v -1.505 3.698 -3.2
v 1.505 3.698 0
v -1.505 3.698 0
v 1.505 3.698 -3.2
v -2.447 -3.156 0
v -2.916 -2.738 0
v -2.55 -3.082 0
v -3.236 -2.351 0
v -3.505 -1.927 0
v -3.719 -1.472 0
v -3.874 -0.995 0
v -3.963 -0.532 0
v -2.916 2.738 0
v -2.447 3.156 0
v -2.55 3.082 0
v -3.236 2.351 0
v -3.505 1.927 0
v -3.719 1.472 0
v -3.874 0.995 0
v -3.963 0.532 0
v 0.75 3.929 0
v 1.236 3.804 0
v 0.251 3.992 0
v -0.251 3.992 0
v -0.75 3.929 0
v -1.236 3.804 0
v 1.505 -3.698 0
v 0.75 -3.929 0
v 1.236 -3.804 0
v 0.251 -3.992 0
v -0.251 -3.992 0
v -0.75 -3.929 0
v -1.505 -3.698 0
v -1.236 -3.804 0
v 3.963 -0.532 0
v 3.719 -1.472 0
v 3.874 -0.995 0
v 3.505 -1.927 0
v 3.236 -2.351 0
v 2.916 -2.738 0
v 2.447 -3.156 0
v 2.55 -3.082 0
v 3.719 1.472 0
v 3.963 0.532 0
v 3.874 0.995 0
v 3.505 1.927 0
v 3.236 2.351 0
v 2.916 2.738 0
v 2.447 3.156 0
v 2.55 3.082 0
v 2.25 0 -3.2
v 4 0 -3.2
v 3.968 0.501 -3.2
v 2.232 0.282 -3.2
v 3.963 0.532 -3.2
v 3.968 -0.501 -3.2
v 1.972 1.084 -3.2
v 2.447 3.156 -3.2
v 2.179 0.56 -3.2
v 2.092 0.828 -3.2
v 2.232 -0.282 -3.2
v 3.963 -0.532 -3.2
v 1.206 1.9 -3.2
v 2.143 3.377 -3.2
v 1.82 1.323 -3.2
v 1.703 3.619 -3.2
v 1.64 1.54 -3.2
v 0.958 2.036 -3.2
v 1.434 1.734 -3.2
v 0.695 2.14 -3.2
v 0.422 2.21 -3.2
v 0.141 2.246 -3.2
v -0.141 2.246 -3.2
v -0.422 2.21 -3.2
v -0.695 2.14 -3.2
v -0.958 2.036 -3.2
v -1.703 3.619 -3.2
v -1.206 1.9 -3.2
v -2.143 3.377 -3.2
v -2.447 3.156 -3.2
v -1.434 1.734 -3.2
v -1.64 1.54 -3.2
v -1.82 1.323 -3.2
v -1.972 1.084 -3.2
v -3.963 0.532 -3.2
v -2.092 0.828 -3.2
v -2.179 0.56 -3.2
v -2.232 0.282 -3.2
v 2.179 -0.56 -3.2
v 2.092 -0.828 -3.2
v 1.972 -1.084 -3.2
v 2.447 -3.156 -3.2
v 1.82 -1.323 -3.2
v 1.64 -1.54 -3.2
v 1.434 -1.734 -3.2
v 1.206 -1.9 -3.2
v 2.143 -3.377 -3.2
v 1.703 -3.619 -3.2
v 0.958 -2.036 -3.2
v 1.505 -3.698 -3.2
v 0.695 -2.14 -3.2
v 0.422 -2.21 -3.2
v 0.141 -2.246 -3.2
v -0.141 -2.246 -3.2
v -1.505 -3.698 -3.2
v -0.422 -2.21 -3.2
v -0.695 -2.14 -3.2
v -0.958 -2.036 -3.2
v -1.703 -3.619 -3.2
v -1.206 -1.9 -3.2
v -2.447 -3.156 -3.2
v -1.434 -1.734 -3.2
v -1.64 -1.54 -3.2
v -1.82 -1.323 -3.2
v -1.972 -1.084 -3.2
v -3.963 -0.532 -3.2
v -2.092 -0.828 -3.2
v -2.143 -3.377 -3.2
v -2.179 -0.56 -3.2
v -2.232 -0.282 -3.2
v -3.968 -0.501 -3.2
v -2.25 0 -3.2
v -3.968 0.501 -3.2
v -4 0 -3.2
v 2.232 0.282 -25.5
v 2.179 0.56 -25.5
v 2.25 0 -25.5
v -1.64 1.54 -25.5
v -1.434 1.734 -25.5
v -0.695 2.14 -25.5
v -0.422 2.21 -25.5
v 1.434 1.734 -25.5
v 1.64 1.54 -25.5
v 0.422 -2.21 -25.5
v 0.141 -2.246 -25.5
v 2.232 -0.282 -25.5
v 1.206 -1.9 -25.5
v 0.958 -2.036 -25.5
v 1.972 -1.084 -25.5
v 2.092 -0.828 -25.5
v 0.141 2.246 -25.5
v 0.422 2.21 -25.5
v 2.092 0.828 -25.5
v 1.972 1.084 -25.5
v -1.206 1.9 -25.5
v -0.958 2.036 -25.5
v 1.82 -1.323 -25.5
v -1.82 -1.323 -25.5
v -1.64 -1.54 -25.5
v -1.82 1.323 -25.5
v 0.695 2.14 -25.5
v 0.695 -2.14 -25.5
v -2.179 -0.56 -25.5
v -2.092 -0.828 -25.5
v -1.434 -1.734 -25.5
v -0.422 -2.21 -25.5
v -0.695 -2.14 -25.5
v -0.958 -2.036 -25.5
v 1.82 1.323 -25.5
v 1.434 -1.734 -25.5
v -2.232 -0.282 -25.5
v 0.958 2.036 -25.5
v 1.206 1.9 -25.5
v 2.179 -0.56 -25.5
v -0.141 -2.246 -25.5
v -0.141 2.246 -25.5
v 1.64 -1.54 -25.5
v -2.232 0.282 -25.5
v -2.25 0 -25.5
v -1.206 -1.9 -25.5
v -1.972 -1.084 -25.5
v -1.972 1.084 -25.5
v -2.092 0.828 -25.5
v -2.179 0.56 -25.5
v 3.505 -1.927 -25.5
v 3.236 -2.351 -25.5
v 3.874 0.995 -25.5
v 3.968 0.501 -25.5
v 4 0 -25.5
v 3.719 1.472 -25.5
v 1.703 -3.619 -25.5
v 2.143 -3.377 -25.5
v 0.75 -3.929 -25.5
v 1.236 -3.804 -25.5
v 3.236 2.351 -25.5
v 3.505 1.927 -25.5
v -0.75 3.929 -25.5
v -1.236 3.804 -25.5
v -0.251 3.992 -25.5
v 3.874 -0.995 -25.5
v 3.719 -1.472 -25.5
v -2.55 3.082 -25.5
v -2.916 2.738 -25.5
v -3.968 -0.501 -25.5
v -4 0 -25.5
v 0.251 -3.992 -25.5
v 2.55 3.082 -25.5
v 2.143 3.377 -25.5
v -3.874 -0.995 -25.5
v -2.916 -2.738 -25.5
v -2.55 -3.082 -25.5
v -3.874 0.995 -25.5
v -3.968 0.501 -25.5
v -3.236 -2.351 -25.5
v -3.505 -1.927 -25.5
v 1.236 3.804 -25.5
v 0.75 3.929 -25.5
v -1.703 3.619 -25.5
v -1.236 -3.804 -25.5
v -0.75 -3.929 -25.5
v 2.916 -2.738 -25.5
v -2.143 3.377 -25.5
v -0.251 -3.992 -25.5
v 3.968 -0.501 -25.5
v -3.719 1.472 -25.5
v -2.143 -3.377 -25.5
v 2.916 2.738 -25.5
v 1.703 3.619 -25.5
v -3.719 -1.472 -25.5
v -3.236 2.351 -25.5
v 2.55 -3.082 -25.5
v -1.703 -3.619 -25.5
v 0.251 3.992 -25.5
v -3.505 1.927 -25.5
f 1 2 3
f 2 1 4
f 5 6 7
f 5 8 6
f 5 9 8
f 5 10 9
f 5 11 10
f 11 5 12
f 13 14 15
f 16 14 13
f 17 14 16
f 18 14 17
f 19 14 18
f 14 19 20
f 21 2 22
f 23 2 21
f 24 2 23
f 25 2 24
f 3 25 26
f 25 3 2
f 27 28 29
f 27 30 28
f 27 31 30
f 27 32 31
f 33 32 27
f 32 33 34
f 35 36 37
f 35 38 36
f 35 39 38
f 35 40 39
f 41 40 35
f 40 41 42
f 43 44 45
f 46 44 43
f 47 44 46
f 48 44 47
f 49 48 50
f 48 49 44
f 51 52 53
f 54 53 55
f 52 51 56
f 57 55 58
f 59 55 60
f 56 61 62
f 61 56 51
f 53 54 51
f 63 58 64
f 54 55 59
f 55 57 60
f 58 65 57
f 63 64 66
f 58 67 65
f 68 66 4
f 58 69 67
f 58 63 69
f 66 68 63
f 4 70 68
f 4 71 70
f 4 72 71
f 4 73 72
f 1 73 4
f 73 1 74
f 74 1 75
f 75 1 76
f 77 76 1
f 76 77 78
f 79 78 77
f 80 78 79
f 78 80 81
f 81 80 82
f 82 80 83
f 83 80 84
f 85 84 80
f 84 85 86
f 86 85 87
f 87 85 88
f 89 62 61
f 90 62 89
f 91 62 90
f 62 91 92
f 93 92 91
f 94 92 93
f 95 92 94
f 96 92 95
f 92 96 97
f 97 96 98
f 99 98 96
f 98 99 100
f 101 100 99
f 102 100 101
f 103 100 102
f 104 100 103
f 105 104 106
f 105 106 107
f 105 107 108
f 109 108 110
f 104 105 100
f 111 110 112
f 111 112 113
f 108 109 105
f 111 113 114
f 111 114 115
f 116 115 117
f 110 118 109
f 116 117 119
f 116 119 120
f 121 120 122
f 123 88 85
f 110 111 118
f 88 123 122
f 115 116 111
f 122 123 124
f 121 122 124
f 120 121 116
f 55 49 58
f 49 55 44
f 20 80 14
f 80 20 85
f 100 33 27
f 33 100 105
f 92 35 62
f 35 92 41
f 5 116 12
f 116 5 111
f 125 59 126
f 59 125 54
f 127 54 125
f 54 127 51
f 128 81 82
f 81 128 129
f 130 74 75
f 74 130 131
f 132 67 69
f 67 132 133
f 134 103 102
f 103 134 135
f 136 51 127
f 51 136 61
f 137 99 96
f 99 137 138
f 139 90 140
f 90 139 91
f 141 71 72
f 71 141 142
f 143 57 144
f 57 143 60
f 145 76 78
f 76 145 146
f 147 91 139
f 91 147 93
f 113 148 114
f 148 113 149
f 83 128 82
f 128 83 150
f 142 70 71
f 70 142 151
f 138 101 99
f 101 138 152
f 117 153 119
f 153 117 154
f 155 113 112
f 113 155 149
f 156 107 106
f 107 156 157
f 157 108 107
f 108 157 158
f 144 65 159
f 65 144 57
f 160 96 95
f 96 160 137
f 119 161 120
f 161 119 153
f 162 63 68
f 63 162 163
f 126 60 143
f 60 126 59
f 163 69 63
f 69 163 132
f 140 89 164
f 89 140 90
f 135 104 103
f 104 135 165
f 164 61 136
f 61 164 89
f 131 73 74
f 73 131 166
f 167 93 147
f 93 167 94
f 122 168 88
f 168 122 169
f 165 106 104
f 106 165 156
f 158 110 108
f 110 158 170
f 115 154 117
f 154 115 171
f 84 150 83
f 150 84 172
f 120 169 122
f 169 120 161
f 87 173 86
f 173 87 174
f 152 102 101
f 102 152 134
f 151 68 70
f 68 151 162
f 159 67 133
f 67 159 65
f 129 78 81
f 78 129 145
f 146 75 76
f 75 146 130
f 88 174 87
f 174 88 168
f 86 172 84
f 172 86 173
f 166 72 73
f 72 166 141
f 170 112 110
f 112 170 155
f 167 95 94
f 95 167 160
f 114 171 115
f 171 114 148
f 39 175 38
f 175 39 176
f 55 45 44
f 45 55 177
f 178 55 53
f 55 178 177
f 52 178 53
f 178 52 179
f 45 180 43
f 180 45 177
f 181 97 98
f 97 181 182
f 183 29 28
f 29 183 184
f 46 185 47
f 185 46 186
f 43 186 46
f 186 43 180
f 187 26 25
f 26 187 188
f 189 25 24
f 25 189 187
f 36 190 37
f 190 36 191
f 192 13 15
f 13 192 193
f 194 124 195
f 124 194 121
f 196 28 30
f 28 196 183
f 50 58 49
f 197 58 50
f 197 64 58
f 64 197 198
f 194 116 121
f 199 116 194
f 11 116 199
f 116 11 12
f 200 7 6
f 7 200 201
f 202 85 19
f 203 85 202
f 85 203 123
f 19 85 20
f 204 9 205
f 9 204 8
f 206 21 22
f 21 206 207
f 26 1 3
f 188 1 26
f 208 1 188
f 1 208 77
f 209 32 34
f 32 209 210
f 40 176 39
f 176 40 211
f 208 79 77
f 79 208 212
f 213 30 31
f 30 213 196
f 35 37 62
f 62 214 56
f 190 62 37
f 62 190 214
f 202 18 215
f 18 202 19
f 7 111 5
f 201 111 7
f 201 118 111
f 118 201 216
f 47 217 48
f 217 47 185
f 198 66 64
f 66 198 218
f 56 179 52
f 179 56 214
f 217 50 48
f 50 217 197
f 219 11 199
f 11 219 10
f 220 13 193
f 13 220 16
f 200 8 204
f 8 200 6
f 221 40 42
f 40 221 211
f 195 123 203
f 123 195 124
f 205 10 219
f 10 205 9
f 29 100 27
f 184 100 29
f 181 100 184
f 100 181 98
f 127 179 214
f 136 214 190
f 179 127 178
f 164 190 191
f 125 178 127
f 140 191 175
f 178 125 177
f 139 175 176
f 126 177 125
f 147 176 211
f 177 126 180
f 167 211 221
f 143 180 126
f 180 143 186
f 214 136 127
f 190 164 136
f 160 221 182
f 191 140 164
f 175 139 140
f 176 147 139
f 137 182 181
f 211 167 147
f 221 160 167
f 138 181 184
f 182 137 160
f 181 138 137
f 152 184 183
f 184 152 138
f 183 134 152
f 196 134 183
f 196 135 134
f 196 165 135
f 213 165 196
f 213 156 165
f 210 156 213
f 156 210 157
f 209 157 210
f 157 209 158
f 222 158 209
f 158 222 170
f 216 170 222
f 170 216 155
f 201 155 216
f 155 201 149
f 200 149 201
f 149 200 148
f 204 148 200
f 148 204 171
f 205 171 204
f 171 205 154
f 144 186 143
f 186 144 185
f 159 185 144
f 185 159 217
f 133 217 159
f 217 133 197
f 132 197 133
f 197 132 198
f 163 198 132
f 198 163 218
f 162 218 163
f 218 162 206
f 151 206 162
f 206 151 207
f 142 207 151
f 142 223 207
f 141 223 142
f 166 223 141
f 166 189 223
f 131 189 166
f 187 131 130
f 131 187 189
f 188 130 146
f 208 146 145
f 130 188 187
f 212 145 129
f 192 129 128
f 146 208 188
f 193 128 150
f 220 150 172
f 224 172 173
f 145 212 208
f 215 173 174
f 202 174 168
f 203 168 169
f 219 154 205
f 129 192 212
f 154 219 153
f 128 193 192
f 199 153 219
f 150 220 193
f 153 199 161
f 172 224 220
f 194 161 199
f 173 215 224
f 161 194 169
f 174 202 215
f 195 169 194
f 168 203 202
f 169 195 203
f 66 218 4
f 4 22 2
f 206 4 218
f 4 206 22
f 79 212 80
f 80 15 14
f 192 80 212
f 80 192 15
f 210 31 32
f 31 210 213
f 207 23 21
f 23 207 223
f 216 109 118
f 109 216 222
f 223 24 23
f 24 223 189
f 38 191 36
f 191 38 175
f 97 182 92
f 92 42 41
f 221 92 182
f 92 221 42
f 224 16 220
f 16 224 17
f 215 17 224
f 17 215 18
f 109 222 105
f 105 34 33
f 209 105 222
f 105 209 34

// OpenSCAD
$fn = 50;

difference() {
	union() {
		translate(v = [0, 0, -25.5]) {
			cylinder(h = 28.5, r = 4.0);
		}
	}
	union() {
		translate(v = [0, 0, 0]) {
			rotate(a = [0, 0, 0]) {
				difference() {
					union() {
						translate(v = [0, 0, -3.2]) {
							linear_extrude(height = 3.2) {
								polygon(points = [[4.2698, 0.0], [2.1349000000000005, 3.697755269078796], [-2.134899999999999, 3.6977552690787965], [-4.2698, 5.228996902999369e-16], [-2.134900000000002, -3.6977552690787956], [2.1348999999999974, -3.697755269078798]]);
							}
						}
					}
					union();
				}
			}
		}
		#cylinder(h = 3, r = 5.0);
		#translate(v = [0, 0, -100.0]) {
			cylinder(h = 200, r = 2.25);
		}
	}
}
